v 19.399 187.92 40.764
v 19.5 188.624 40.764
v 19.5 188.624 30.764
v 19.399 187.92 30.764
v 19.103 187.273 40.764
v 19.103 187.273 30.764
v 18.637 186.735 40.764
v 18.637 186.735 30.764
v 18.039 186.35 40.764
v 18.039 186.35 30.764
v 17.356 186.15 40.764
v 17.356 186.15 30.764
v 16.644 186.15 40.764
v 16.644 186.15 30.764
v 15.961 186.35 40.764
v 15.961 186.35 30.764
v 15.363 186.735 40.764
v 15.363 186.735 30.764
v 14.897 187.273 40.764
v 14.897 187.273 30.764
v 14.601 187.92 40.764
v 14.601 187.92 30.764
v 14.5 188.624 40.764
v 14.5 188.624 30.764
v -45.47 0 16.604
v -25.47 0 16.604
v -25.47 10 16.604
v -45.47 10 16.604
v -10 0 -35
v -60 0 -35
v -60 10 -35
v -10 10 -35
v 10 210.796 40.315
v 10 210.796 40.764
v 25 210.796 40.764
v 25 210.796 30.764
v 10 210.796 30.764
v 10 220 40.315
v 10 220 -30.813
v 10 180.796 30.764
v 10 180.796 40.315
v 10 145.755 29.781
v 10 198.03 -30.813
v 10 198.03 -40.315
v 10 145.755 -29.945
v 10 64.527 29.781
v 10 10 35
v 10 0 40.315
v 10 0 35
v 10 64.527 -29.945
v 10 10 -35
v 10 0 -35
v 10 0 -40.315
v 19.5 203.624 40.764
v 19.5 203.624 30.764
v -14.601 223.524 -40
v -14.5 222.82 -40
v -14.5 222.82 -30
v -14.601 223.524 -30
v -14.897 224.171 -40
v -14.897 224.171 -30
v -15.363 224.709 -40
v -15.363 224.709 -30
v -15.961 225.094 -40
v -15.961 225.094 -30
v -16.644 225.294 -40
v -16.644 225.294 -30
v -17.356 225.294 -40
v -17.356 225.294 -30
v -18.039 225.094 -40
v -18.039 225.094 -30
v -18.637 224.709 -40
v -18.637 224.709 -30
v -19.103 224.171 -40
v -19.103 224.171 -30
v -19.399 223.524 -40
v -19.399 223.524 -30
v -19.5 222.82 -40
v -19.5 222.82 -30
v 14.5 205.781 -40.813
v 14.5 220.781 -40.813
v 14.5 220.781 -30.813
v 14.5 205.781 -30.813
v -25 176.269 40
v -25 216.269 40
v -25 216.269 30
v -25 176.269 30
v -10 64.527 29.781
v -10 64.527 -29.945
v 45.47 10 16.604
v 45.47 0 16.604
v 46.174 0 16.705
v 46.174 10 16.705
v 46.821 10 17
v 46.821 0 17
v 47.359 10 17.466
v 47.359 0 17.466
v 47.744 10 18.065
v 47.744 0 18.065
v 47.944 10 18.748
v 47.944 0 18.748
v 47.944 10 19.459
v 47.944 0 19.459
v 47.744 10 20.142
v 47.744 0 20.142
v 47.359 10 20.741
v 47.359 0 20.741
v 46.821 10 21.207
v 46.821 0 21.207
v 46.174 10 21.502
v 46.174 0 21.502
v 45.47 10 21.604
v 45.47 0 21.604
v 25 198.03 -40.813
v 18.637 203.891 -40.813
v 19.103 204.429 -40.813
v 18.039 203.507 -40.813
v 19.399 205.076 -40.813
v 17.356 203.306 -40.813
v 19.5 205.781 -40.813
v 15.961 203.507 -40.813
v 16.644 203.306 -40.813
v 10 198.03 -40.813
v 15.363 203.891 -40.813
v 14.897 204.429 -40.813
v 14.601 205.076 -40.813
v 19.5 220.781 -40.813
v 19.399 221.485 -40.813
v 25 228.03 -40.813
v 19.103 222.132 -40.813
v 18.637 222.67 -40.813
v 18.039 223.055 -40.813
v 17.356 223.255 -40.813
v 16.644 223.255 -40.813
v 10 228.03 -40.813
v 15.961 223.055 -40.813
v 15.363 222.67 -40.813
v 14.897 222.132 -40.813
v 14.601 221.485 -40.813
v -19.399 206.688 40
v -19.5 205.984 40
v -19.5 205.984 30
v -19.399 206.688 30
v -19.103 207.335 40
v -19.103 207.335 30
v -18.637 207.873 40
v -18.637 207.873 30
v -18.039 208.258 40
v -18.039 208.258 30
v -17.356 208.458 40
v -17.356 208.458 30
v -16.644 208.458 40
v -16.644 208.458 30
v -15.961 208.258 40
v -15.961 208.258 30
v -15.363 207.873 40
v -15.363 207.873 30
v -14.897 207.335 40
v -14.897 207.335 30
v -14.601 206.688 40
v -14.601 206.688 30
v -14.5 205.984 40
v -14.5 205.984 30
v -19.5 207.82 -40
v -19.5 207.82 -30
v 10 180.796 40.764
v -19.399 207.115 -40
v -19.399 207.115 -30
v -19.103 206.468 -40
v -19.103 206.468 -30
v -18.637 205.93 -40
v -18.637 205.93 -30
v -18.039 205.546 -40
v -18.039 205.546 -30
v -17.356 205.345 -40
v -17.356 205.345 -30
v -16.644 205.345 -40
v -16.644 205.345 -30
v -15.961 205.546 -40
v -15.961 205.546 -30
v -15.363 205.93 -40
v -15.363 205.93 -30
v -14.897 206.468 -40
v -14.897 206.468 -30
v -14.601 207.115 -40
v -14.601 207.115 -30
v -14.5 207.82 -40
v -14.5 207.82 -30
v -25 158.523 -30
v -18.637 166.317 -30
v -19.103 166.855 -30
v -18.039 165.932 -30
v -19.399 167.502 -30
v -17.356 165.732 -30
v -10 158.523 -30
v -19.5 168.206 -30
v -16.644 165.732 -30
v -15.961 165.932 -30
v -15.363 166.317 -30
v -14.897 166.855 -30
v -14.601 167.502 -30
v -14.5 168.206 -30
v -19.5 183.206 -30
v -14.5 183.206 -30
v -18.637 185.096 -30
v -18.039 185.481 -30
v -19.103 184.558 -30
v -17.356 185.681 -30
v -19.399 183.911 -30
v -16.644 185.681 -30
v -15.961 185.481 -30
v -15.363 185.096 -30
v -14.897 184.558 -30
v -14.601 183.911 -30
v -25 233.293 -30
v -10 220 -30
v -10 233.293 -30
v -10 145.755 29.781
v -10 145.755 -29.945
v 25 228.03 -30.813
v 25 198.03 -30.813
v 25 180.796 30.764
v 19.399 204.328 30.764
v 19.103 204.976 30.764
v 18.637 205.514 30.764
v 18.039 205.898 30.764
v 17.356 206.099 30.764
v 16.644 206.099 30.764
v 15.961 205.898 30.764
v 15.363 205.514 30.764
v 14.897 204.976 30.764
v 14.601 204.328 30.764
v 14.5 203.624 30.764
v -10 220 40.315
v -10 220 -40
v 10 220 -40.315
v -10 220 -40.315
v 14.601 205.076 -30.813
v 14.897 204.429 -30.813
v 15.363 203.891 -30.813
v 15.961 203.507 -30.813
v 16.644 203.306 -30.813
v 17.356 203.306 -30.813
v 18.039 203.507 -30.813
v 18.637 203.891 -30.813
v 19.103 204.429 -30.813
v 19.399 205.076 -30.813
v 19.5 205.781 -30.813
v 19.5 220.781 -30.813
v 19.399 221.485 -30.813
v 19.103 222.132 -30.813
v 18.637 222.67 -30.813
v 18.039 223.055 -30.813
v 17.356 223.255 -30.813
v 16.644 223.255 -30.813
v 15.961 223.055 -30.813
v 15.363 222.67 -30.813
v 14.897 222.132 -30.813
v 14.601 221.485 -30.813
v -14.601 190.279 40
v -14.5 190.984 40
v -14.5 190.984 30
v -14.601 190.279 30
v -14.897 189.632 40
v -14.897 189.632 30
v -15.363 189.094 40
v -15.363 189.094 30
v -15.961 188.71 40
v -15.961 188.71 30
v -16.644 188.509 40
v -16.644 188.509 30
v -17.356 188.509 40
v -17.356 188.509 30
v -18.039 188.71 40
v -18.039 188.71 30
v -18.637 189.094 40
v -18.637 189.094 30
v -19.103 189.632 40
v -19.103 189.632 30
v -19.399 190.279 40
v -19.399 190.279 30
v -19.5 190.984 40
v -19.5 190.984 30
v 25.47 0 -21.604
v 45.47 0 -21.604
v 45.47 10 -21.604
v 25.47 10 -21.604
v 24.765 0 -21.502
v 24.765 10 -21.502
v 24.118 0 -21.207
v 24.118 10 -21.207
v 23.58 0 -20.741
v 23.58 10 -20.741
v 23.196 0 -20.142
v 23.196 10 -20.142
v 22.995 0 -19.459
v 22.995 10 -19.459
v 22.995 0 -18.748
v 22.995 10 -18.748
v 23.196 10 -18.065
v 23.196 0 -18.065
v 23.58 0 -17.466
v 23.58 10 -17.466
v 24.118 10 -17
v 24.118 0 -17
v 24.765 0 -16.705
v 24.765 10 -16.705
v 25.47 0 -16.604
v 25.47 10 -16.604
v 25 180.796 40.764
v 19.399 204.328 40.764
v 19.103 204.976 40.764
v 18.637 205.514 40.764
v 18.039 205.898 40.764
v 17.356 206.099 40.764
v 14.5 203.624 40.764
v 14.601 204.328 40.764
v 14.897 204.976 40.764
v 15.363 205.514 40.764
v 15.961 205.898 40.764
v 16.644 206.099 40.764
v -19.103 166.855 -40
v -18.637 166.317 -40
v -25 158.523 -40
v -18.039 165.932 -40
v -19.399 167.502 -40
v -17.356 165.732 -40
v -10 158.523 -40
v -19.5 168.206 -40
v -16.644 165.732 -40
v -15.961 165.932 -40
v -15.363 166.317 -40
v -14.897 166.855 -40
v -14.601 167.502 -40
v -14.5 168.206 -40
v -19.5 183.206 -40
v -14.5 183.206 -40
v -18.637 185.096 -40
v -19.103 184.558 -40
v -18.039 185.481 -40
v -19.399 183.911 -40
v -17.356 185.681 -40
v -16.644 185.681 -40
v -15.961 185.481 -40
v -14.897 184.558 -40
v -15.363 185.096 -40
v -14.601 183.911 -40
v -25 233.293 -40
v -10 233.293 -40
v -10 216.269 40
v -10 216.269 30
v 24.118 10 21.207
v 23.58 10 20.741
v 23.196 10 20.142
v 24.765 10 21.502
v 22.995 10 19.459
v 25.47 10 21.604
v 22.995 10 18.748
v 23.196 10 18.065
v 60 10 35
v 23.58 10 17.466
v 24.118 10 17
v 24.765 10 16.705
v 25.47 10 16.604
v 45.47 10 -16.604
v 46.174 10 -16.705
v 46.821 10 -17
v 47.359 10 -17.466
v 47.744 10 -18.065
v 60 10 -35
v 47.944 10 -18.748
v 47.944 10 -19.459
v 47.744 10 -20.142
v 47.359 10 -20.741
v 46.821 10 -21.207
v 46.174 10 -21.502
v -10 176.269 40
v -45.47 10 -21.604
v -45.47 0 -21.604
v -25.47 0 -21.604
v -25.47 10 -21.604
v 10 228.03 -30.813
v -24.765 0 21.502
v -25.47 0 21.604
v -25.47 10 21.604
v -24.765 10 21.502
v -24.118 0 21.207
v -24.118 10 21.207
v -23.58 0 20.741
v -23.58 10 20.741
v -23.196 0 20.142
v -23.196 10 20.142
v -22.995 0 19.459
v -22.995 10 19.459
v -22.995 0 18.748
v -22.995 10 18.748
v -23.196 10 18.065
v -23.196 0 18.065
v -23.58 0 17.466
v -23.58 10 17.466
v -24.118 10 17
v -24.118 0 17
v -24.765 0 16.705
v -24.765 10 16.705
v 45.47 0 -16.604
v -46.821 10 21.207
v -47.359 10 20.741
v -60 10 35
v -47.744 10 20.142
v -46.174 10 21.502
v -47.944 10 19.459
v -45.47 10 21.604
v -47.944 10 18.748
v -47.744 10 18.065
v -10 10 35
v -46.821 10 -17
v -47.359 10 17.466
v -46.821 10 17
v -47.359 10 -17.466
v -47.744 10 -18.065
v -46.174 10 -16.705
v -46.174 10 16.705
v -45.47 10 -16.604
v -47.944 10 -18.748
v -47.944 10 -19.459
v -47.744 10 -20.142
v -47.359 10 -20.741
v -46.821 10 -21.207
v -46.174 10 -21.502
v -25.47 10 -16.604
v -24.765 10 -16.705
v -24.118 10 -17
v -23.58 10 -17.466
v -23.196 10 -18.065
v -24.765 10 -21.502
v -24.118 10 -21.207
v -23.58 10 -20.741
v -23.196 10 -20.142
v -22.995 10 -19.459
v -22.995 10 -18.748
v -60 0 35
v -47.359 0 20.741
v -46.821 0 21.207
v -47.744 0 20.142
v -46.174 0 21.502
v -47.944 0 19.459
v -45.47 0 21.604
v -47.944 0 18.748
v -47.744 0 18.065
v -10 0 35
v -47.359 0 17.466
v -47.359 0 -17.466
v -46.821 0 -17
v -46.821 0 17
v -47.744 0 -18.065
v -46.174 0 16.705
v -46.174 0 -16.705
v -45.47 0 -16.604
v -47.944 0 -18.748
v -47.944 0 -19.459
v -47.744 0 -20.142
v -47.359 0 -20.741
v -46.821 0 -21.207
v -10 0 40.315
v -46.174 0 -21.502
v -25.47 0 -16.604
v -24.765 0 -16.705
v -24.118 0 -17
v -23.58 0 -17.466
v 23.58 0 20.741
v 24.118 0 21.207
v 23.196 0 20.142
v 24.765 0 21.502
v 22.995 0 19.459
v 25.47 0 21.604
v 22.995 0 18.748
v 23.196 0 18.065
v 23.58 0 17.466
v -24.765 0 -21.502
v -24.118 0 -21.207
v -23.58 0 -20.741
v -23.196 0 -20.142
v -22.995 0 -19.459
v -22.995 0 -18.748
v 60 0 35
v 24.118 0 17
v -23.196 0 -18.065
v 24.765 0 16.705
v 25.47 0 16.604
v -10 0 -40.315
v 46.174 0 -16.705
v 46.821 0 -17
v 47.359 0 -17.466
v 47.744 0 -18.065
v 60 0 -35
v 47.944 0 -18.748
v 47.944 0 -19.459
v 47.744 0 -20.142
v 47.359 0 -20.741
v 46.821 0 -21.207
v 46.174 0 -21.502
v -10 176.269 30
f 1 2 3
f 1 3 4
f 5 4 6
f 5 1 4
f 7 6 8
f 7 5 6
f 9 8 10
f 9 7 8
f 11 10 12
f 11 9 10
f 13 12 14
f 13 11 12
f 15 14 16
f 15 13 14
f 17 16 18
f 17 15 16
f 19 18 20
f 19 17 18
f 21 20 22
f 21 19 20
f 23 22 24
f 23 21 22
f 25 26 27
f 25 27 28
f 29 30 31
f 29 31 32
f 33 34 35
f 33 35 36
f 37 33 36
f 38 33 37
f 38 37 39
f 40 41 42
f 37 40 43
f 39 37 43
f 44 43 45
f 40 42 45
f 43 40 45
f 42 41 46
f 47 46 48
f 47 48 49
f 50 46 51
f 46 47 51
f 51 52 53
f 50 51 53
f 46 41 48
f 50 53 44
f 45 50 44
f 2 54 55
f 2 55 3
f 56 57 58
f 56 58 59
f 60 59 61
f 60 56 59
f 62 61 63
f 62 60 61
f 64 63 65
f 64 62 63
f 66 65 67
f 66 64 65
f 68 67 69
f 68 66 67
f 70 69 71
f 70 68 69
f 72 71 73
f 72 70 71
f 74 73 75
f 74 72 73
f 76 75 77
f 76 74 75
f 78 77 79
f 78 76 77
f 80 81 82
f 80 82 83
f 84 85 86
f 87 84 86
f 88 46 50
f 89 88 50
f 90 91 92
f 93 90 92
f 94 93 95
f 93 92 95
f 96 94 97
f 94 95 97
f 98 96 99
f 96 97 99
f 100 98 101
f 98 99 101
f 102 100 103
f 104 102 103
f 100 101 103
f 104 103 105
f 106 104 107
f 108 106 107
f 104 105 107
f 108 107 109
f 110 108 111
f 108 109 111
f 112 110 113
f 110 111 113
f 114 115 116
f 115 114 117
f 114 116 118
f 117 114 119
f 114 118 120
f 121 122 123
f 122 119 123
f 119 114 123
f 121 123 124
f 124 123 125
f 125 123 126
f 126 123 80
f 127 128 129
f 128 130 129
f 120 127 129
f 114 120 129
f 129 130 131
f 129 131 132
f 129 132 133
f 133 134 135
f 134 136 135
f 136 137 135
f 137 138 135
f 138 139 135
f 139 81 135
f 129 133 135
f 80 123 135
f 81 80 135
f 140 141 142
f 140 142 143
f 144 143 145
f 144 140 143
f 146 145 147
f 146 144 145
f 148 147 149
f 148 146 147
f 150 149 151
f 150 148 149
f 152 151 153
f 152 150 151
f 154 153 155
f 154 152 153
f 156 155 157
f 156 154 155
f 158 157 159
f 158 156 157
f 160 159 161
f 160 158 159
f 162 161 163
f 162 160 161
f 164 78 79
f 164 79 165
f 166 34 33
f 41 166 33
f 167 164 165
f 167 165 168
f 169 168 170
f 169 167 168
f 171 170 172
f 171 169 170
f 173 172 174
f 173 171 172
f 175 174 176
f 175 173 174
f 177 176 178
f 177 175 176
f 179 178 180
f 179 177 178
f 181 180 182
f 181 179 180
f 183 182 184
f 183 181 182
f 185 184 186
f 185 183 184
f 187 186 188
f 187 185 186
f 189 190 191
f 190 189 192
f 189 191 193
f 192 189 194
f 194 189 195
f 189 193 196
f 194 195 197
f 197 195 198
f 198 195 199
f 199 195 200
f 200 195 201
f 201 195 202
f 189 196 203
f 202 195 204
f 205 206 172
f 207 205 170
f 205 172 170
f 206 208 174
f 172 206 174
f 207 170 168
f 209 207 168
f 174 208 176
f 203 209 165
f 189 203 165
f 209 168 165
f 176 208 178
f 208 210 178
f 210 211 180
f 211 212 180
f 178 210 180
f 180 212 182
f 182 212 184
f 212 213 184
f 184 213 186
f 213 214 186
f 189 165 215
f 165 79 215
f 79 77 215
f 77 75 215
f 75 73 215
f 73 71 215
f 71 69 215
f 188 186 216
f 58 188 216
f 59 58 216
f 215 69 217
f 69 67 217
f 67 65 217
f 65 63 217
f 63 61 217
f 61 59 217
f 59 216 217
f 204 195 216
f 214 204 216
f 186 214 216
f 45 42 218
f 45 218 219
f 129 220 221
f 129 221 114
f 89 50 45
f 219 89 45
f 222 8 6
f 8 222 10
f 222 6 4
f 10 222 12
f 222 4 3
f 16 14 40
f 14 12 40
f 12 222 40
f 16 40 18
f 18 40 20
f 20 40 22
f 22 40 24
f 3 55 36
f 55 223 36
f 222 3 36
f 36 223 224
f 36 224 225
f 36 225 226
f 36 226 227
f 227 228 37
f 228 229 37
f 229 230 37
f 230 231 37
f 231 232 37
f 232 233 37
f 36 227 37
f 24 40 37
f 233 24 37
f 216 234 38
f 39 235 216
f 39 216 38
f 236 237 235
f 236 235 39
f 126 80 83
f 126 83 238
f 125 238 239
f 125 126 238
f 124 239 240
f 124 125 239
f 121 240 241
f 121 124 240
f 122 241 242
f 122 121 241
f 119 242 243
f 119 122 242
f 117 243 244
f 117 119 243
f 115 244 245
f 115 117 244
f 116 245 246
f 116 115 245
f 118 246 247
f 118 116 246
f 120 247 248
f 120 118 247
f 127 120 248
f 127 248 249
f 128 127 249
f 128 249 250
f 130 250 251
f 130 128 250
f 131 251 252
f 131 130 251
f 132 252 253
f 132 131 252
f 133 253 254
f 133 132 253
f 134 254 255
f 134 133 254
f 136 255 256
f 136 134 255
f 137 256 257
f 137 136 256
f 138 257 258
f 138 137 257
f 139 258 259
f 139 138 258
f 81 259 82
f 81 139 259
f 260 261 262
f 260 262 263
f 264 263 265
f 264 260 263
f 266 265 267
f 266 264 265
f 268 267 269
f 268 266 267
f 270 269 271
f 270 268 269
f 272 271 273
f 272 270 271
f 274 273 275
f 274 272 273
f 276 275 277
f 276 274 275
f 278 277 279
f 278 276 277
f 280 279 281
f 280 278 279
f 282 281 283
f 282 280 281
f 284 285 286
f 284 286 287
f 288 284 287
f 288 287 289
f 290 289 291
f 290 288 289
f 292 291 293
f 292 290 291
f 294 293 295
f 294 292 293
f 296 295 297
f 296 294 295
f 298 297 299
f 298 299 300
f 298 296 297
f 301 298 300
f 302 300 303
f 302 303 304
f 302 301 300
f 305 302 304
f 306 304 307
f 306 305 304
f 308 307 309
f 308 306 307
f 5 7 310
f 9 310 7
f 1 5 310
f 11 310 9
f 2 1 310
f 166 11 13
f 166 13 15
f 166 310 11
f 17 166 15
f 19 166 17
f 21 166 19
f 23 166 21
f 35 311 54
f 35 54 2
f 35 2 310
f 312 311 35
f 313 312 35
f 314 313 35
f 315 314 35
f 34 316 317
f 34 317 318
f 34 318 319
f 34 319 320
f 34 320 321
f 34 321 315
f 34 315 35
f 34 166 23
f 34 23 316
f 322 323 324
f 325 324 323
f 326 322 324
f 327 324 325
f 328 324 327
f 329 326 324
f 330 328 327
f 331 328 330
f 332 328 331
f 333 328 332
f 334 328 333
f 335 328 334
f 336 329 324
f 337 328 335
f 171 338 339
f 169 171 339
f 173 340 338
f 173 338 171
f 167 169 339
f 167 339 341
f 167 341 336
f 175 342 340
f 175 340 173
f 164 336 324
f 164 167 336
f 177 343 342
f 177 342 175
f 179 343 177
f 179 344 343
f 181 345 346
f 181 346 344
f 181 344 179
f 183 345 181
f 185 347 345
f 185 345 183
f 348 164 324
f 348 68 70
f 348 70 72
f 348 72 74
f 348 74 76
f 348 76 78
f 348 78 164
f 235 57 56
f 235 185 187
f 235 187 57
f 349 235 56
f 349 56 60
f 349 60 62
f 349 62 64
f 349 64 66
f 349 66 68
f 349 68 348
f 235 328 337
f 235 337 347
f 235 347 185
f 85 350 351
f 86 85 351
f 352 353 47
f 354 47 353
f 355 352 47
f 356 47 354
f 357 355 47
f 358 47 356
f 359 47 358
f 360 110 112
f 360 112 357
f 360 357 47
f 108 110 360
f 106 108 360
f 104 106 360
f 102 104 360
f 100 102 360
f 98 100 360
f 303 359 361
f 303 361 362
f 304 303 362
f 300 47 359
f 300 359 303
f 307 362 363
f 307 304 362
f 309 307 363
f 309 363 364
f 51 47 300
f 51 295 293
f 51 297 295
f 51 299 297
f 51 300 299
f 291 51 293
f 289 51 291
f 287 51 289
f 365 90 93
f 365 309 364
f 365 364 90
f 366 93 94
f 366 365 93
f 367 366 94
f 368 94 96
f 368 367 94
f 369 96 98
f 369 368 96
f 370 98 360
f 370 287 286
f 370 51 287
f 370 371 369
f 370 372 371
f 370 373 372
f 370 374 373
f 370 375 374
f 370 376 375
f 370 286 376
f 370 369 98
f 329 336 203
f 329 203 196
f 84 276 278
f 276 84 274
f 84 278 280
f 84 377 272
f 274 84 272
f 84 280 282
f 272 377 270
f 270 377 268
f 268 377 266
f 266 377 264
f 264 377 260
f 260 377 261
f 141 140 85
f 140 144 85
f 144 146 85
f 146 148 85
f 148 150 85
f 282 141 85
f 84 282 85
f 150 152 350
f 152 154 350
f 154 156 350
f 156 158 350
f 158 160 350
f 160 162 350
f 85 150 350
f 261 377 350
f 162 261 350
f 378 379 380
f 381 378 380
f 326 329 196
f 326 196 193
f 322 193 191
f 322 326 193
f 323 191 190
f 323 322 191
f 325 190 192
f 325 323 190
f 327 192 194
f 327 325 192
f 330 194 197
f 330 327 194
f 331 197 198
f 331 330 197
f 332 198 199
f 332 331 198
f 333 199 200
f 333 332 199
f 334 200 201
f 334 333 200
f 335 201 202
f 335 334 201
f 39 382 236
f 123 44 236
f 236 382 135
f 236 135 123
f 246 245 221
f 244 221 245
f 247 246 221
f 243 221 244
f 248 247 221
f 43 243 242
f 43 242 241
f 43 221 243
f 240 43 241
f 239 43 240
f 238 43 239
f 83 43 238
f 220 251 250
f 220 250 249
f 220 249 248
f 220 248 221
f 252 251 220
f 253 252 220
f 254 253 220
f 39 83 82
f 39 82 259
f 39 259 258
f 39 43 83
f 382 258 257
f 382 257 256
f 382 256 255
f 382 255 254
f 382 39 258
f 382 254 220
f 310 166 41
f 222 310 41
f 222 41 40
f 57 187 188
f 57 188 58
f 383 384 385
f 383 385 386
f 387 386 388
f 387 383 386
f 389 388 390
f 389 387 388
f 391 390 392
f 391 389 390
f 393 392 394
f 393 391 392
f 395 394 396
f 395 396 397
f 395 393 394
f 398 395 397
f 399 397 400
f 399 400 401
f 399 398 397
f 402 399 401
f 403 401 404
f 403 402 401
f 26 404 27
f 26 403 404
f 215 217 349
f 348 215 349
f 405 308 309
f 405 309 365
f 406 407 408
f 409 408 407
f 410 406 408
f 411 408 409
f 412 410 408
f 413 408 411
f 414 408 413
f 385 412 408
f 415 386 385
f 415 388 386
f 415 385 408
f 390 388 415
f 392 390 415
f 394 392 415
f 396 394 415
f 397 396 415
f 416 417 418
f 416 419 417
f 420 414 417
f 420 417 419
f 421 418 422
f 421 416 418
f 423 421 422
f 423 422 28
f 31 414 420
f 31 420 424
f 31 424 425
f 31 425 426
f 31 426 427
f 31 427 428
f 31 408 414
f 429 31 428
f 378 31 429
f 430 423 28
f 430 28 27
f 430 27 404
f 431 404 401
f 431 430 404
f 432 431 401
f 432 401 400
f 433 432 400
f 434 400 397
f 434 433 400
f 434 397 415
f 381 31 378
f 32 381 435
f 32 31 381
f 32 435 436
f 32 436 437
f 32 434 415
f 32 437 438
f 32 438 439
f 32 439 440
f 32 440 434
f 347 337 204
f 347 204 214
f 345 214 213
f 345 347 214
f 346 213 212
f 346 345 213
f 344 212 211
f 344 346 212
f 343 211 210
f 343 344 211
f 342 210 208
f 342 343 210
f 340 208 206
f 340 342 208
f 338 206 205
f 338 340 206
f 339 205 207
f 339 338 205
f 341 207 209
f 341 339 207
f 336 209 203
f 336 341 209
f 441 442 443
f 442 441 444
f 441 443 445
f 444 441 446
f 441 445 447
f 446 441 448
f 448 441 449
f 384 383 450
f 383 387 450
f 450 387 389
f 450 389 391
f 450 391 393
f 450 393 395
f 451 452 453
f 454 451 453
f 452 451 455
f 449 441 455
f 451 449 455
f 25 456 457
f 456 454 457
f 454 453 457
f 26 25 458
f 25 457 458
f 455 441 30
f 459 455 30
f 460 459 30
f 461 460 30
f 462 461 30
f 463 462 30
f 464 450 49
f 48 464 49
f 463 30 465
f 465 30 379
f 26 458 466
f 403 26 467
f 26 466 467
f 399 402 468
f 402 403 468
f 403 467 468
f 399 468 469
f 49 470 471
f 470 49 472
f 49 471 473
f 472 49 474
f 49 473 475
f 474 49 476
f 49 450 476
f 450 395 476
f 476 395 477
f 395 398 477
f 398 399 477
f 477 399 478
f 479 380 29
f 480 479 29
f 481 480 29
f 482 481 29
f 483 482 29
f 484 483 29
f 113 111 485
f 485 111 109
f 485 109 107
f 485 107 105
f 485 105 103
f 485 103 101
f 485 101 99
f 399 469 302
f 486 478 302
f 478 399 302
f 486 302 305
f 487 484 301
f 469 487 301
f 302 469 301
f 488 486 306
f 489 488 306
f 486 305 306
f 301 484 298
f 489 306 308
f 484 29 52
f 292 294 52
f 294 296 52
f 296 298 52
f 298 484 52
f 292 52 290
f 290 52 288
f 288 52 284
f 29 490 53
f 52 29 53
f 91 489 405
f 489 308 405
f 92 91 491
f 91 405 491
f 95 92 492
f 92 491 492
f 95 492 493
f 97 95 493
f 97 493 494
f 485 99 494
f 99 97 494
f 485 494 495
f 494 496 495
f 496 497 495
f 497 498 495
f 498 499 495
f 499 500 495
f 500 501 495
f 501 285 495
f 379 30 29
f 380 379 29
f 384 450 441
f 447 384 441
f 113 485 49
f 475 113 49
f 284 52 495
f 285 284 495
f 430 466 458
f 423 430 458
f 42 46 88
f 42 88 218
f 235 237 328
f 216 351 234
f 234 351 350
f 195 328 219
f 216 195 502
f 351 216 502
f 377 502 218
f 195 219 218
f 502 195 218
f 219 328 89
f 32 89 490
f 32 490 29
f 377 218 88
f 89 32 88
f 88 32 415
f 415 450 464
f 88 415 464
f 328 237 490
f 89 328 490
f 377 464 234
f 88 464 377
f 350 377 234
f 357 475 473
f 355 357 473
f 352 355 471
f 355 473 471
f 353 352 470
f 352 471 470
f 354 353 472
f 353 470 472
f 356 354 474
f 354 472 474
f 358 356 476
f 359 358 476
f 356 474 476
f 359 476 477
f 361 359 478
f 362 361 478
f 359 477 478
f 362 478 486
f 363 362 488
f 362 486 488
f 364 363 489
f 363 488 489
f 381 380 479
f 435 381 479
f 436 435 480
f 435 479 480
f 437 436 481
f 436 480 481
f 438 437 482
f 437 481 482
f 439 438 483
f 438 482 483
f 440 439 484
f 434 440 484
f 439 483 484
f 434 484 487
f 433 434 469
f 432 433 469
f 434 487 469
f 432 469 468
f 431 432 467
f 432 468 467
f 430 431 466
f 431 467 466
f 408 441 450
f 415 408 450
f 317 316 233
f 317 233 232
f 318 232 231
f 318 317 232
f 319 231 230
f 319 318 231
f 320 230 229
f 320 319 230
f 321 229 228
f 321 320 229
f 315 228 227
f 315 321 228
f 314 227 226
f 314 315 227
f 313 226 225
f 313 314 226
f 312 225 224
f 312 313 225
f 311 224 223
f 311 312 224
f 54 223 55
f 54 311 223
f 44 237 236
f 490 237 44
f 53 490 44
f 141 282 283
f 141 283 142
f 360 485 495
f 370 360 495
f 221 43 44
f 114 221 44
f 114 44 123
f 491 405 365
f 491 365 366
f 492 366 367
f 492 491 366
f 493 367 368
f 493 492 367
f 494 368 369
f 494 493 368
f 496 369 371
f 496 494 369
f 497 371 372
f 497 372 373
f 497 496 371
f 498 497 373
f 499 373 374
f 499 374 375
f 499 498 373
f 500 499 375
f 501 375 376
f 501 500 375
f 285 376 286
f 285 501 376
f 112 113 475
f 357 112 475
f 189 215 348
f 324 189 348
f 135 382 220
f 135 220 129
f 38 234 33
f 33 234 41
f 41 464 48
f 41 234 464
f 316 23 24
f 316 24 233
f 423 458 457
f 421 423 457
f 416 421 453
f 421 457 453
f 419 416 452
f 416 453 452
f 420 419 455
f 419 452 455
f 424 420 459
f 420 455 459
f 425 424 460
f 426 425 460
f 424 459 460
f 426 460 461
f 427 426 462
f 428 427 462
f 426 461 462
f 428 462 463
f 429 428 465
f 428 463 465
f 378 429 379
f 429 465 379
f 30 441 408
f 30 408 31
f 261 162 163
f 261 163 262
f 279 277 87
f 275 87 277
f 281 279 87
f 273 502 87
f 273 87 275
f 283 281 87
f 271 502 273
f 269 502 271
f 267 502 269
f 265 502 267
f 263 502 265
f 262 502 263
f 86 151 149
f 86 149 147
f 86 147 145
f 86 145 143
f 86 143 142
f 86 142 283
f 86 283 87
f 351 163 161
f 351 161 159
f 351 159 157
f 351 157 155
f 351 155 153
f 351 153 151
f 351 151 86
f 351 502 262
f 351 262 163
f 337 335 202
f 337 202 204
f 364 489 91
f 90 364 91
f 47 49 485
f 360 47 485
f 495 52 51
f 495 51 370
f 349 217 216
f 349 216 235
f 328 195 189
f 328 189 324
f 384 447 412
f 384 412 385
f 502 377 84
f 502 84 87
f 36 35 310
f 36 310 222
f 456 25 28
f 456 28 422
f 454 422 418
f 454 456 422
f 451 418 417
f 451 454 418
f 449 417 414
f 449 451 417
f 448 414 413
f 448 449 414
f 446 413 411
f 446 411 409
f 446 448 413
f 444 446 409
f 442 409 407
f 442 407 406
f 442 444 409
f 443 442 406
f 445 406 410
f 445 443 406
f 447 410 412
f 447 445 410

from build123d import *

# Parameters (mm, degrees)
SKETCH1_W           = 120
SKETCH1_H           = 70
BOSS_EXTRUDE1_DEPTH = 10
SKETCH1_3_W         = 20
SKETCH1_3_H         = 70
SKETCH1_3_H_2       = 5.314701235
BOSS_EXTRUDE2_DEPTH = 220
BOSS_EXTRUDE3_START = -20
SKETCH2_W           = 10
SKETCH2_H           = 40
SKETCH2_H_2         = 74.770020504
BOSS_EXTRUDE3_DEPTH = 15
SKETCH3_W           = 59.726354491
SKETCH3_H           = 81.227842107
CUT_EXTRUDE1_DEPTH  = 60
CUT_EXTRUDE2_REACH  = 255.922
CUT_EXTRUDE3_REACH  = 255.922
SKETCH6_W           = 10
SKETCH6_H           = 30
BOSS_EXTRUDE4_DEPTH = 15
CUT_EXTRUDE4_REACH  = 256.324
CUT_EXTRUDE5_REACH  = 256.324


with BuildPart() as part:
    # Sketch1 → Boss-Extrude1 (new body)
    with BuildSketch(Plane(origin=(0, 0, 0), x_dir=(1, 0, 0), z_dir=(0, 1, 0))):
        Rectangle(SKETCH1_W, SKETCH1_H)
        with BuildLine():
            Line((-45.469645663, 21.603573917), (-25.469645663, 21.603573917))
            ThreePointArc((-25.469645663, 21.603573917), (-22.969645663, 19.103573917), (-25.469645663, 16.603573917))
            Line((-25.469645663, 16.603573917), (-45.469645663, 16.603573917))
            ThreePointArc((-45.469645663, 16.603573917), (-47.969645663, 19.103573917), (-45.469645663, 21.603573917))
        make_face(mode=Mode.SUBTRACT)
        with BuildLine():
            Line((45.469645663, 21.603573917), (25.469645663, 21.603573917))
            ThreePointArc((25.469645663, 21.603573917), (22.969645663, 19.103573917), (25.469645663, 16.603573917))
            Line((25.469645663, 16.603573917), (45.469645663, 16.603573917))
            ThreePointArc((45.469645663, 16.603573917), (47.969645663, 19.103573917), (45.469645663, 21.603573917))
        make_face(mode=Mode.SUBTRACT)
        with BuildLine():
            Line((45.469645663, -21.603573917), (25.469645663, -21.603573917))
            ThreePointArc((25.469645663, -21.603573917), (22.969645663, -19.103573917), (25.469645663, -16.603573917))
            Line((25.469645663, -16.603573917), (45.469645663, -16.603573917))
            ThreePointArc((45.469645663, -16.603573917), (47.969645663, -19.103573917), (45.469645663, -21.603573917))
        make_face(mode=Mode.SUBTRACT)
        with BuildLine():
            Line((-45.469645663, -21.603573917), (-25.469645663, -21.603573917))
            ThreePointArc((-25.469645663, -21.603573917), (-22.969645663, -19.103573917), (-25.469645663, -16.603573917))
            Line((-25.469645663, -16.603573917), (-45.469645663, -16.603573917))
            ThreePointArc((-45.469645663, -16.603573917), (-47.969645663, -19.103573917), (-45.469645663, -21.603573917))
        make_face(mode=Mode.SUBTRACT)
    extrude(amount=BOSS_EXTRUDE1_DEPTH)

    # Sketch1<3> → Boss-Extrude2 (add)
    with BuildSketch(Plane(origin=(0, 0, 0), x_dir=(1, 0, 0), z_dir=(0, 1, 0))):
        Rectangle(SKETCH1_3_W, SKETCH1_3_H)
        with Locations((0, 37.657350618)):
            Rectangle(SKETCH1_3_W, SKETCH1_3_H_2)
        with Locations((0, -37.657350618)):
            Rectangle(SKETCH1_3_W, SKETCH1_3_H_2)
    extrude(amount=BOSS_EXTRUDE2_DEPTH)

    # Sketch2 → Boss-Extrude3 (add)
    with BuildSketch(Plane(origin=(10, 0, 0), x_dir=(0, 0, -1), z_dir=(1, 0, 0)).offset(BOSS_EXTRUDE3_START)):
        with Locations((-35, 196.268517414)):
            Rectangle(SKETCH2_W, SKETCH2_H)
        with Locations((35, 195.908265462)):
            Rectangle(SKETCH2_W, SKETCH2_H_2)
    extrude(amount=-BOSS_EXTRUDE3_DEPTH)

    # Sketch3 → Cut-Extrude1 (cut)
    with BuildSketch(Plane(origin=(10, 0, 0), x_dir=(0, 0, -1), z_dir=(1, 0, 0))):
        with Locations((0.081735862, 105.141319111)):
            Rectangle(SKETCH3_W, SKETCH3_H)
    extrude(amount=-CUT_EXTRUDE1_DEPTH, mode=Mode.SUBTRACT)

    # Sketch4 → Cut-Extrude2 (cut, up to next)
    with BuildSketch(Plane.XY.offset(40), mode=Mode.PRIVATE) as cut_extrude2_sk1:
        with BuildLine():
            Line((-14.5, 205.983659563), (-14.5, 190.983659563))
            ThreePointArc((-14.5, 190.983659563), (-17, 188.483659563), (-19.5, 190.983659563))
            Line((-19.5, 190.983659563), (-19.5, 205.983659563))
            ThreePointArc((-19.5, 205.983659563), (-17, 208.483659563), (-14.5, 205.983659563))
        make_face()
    cut_extrude2_tool1 = extrude(cut_extrude2_sk1.sketch, amount=-CUT_EXTRUDE2_REACH, mode=Mode.PRIVATE) & part.part
    add(cut_extrude2_tool1.solids().sort_by_distance((-17, 198.48366, 40))[0], mode=Mode.SUBTRACT)

    # Sketch5 → Cut-Extrude3 (cut, up to next)
    with BuildSketch(Plane(origin=(0, 0, -40), x_dir=(-1, 0, 0), z_dir=(0, 0, -1)), mode=Mode.PRIVATE) as cut_extrude3_sk1:
        with BuildLine():
            Line((19.5, 222.819701207), (19.5, 207.819701207))
            ThreePointArc((19.5, 207.819701207), (17, 205.319701207), (14.5, 207.819701207))
            Line((14.5, 207.819701207), (14.5, 222.819701207))
            ThreePointArc((14.5, 222.819701207), (17, 225.319701207), (19.5, 222.819701207))
        make_face()
    cut_extrude3_tool1 = extrude(cut_extrude3_sk1.sketch, amount=-CUT_EXTRUDE3_REACH, mode=Mode.PRIVATE) & part.part
    # Sketch5 → Cut-Extrude3 (cut, up to next)
    with BuildSketch(Plane(origin=(0, 0, -40), x_dir=(-1, 0, 0), z_dir=(0, 0, -1)), mode=Mode.PRIVATE) as cut_extrude3_sk2:
        with BuildLine():
            Line((19.5, 183.206485392), (19.5, 168.206485392))
            ThreePointArc((19.5, 168.206485392), (17, 165.706485392), (14.5, 168.206485392))
            Line((14.5, 168.206485392), (14.5, 183.206485392))
            ThreePointArc((14.5, 183.206485392), (17, 185.706485392), (19.5, 183.206485392))
        make_face()
    cut_extrude3_tool2 = extrude(cut_extrude3_sk2.sketch, amount=-CUT_EXTRUDE3_REACH, mode=Mode.PRIVATE) & part.part
    add(cut_extrude3_tool1.solids().sort_by_distance((-17, 215.319701, -40))[0], mode=Mode.SUBTRACT)
    add(cut_extrude3_tool2.solids().sort_by_distance((-17, 175.706485, -40))[0], mode=Mode.SUBTRACT)

    # Sketch6 → Boss-Extrude4 (add)
    with BuildSketch(Plane(origin=(10, 0, 0), x_dir=(0, 0, -1), z_dir=(1, 0, 0))):
        with Locations((-35.763941906, 195.796360994)):
            Rectangle(SKETCH6_W, SKETCH6_H)
        with Locations((35.812510383, 213.029875947)):
            Rectangle(SKETCH6_W, SKETCH6_H)
    extrude(amount=BOSS_EXTRUDE4_DEPTH)

    # Sketch7 → Cut-Extrude4 (cut, up to next)
    with BuildSketch(Plane.XY.offset(40.763941906), mode=Mode.PRIVATE) as cut_extrude4_sk1:
        with BuildLine():
            Line((19.5, 203.624140304), (19.5, 188.624140304))
            ThreePointArc((19.5, 188.624140304), (17, 186.124140304), (14.5, 188.624140304))
            Line((14.5, 188.624140304), (14.5, 203.624140304))
            ThreePointArc((14.5, 203.624140304), (17, 206.124140304), (19.5, 203.624140304))
        make_face()
    cut_extrude4_tool1 = extrude(cut_extrude4_sk1.sketch, amount=-CUT_EXTRUDE4_REACH, mode=Mode.PRIVATE) & part.part
    add(cut_extrude4_tool1.solids().sort_by_distance((17, 196.12414, 40.763942))[0], mode=Mode.SUBTRACT)

    # Sketch8 → Cut-Extrude5 (cut, up to next)
    with BuildSketch(Plane(origin=(0, 0, -40.812510383), x_dir=(-1, 0, 0), z_dir=(0, 0, -1)), mode=Mode.PRIVATE) as cut_extrude5_sk1:
        with BuildLine():
            Line((-14.5, 220.7806332), (-14.5, 205.7806332))
            ThreePointArc((-14.5, 205.7806332), (-17, 203.2806332), (-19.5, 205.7806332))
            Line((-19.5, 205.7806332), (-19.5, 220.7806332))
            ThreePointArc((-19.5, 220.7806332), (-17, 223.2806332), (-14.5, 220.7806332))
        make_face()
    cut_extrude5_tool1 = extrude(cut_extrude5_sk1.sketch, amount=-CUT_EXTRUDE5_REACH, mode=Mode.PRIVATE) & part.part
    add(cut_extrude5_tool1.solids().sort_by_distance((17, 213.280633, -40.81251))[0], mode=Mode.SUBTRACT)


solid = part.part
